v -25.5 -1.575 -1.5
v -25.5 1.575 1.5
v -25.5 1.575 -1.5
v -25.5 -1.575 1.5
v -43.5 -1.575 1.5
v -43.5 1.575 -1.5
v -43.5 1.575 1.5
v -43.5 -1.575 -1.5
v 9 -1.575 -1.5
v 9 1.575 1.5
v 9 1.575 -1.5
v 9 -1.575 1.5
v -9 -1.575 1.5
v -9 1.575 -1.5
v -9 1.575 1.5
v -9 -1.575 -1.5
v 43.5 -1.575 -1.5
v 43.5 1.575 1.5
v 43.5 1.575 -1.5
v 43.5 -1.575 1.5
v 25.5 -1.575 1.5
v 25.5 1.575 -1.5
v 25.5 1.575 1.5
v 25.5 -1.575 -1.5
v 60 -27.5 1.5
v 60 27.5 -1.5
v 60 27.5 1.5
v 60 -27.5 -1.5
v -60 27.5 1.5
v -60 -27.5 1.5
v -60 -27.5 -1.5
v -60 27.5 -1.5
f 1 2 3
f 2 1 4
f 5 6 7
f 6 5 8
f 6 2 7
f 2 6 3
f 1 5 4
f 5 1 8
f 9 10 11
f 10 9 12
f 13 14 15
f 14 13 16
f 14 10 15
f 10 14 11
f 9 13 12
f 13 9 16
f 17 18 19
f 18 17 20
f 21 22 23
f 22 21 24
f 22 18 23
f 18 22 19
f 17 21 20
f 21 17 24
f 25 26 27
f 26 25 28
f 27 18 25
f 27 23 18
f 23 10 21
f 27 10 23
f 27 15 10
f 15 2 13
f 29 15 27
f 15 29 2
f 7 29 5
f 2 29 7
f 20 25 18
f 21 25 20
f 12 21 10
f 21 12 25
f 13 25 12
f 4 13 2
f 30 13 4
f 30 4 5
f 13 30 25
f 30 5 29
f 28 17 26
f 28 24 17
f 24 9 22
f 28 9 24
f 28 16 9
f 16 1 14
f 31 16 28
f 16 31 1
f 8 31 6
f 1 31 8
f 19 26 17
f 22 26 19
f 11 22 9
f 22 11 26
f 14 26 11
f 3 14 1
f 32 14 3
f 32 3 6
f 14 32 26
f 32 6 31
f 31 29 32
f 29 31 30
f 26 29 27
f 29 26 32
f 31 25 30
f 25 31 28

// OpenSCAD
// OpenSCAD Model: Laser-cut Plywood Tab-Slot Panel
// Finished outer profile: 120 x 55 mm, Thickness: 3.0 mm
// 3 through-slots in a centered horizontal row: 18 x 3.15 mm

// Design parameters
panel_width = 120.0;
panel_height = 55.0;
panel_thickness = 3.0;

slot_length = 18.0;
slot_width = 3.15;
slot_count = 3;

// Calculate horizontal spacing to center the slots and distribute spacing equally.
// Total slot width along X:
total_slots_length = slot_count * slot_length; // 54.0 mm
// The number of spaces is slot_count + 1 = 4 spaces (2 margins + 2 webs)
num_spaces = slot_count + 1;
space_width = (panel_width - total_slots_length) / num_spaces; // (120 - 54) / 4 = 16.5 mm

// Ensure minimum web constraint is met (must be >= 6.0 mm)
// The min web is the space_width (16.5 mm) since the vertical web is (55 - 3.15)/2 = 25.925 mm.
min_web = space_width;

// Echo the required manifest line
echo(str("MAKERBENCH-LASER2D: {",
     "\"material_thickness_mm\": ", panel_thickness, ", ",
     "\"kerf_mm\": 0.2, ",
     "\"slot_count\": ", slot_count, ", ",
     "\"slot_length_mm\": ", slot_length, ", ",
     "\"slot_width_mm\": ", slot_width, ", ",
     "\"min_web_mm\": ", min_web,
     "}"));

module panel() {
    difference() {
        // Outer panel profile centered at origin
        cube([panel_width, panel_height, panel_thickness], center = true);
        
        // 3 through-slots
        for (i = [0 : slot_count - 1]) {
            // Calculate center of each slot.
            // Spacing is space_width. Leftmost slot center starts at:
            // -panel_width/2 + space_width + slot_length/2
            // And each subsequent slot is shifted by (space_width + slot_length)
            x_pos = -panel_width/2 + space_width + slot_length/2 + i * (space_width + slot_length);
            
            translate([x_pos, 0, 0])
                cube([slot_length, slot_width, panel_thickness + 1.0], center = true);
        }
    }
}

panel();
